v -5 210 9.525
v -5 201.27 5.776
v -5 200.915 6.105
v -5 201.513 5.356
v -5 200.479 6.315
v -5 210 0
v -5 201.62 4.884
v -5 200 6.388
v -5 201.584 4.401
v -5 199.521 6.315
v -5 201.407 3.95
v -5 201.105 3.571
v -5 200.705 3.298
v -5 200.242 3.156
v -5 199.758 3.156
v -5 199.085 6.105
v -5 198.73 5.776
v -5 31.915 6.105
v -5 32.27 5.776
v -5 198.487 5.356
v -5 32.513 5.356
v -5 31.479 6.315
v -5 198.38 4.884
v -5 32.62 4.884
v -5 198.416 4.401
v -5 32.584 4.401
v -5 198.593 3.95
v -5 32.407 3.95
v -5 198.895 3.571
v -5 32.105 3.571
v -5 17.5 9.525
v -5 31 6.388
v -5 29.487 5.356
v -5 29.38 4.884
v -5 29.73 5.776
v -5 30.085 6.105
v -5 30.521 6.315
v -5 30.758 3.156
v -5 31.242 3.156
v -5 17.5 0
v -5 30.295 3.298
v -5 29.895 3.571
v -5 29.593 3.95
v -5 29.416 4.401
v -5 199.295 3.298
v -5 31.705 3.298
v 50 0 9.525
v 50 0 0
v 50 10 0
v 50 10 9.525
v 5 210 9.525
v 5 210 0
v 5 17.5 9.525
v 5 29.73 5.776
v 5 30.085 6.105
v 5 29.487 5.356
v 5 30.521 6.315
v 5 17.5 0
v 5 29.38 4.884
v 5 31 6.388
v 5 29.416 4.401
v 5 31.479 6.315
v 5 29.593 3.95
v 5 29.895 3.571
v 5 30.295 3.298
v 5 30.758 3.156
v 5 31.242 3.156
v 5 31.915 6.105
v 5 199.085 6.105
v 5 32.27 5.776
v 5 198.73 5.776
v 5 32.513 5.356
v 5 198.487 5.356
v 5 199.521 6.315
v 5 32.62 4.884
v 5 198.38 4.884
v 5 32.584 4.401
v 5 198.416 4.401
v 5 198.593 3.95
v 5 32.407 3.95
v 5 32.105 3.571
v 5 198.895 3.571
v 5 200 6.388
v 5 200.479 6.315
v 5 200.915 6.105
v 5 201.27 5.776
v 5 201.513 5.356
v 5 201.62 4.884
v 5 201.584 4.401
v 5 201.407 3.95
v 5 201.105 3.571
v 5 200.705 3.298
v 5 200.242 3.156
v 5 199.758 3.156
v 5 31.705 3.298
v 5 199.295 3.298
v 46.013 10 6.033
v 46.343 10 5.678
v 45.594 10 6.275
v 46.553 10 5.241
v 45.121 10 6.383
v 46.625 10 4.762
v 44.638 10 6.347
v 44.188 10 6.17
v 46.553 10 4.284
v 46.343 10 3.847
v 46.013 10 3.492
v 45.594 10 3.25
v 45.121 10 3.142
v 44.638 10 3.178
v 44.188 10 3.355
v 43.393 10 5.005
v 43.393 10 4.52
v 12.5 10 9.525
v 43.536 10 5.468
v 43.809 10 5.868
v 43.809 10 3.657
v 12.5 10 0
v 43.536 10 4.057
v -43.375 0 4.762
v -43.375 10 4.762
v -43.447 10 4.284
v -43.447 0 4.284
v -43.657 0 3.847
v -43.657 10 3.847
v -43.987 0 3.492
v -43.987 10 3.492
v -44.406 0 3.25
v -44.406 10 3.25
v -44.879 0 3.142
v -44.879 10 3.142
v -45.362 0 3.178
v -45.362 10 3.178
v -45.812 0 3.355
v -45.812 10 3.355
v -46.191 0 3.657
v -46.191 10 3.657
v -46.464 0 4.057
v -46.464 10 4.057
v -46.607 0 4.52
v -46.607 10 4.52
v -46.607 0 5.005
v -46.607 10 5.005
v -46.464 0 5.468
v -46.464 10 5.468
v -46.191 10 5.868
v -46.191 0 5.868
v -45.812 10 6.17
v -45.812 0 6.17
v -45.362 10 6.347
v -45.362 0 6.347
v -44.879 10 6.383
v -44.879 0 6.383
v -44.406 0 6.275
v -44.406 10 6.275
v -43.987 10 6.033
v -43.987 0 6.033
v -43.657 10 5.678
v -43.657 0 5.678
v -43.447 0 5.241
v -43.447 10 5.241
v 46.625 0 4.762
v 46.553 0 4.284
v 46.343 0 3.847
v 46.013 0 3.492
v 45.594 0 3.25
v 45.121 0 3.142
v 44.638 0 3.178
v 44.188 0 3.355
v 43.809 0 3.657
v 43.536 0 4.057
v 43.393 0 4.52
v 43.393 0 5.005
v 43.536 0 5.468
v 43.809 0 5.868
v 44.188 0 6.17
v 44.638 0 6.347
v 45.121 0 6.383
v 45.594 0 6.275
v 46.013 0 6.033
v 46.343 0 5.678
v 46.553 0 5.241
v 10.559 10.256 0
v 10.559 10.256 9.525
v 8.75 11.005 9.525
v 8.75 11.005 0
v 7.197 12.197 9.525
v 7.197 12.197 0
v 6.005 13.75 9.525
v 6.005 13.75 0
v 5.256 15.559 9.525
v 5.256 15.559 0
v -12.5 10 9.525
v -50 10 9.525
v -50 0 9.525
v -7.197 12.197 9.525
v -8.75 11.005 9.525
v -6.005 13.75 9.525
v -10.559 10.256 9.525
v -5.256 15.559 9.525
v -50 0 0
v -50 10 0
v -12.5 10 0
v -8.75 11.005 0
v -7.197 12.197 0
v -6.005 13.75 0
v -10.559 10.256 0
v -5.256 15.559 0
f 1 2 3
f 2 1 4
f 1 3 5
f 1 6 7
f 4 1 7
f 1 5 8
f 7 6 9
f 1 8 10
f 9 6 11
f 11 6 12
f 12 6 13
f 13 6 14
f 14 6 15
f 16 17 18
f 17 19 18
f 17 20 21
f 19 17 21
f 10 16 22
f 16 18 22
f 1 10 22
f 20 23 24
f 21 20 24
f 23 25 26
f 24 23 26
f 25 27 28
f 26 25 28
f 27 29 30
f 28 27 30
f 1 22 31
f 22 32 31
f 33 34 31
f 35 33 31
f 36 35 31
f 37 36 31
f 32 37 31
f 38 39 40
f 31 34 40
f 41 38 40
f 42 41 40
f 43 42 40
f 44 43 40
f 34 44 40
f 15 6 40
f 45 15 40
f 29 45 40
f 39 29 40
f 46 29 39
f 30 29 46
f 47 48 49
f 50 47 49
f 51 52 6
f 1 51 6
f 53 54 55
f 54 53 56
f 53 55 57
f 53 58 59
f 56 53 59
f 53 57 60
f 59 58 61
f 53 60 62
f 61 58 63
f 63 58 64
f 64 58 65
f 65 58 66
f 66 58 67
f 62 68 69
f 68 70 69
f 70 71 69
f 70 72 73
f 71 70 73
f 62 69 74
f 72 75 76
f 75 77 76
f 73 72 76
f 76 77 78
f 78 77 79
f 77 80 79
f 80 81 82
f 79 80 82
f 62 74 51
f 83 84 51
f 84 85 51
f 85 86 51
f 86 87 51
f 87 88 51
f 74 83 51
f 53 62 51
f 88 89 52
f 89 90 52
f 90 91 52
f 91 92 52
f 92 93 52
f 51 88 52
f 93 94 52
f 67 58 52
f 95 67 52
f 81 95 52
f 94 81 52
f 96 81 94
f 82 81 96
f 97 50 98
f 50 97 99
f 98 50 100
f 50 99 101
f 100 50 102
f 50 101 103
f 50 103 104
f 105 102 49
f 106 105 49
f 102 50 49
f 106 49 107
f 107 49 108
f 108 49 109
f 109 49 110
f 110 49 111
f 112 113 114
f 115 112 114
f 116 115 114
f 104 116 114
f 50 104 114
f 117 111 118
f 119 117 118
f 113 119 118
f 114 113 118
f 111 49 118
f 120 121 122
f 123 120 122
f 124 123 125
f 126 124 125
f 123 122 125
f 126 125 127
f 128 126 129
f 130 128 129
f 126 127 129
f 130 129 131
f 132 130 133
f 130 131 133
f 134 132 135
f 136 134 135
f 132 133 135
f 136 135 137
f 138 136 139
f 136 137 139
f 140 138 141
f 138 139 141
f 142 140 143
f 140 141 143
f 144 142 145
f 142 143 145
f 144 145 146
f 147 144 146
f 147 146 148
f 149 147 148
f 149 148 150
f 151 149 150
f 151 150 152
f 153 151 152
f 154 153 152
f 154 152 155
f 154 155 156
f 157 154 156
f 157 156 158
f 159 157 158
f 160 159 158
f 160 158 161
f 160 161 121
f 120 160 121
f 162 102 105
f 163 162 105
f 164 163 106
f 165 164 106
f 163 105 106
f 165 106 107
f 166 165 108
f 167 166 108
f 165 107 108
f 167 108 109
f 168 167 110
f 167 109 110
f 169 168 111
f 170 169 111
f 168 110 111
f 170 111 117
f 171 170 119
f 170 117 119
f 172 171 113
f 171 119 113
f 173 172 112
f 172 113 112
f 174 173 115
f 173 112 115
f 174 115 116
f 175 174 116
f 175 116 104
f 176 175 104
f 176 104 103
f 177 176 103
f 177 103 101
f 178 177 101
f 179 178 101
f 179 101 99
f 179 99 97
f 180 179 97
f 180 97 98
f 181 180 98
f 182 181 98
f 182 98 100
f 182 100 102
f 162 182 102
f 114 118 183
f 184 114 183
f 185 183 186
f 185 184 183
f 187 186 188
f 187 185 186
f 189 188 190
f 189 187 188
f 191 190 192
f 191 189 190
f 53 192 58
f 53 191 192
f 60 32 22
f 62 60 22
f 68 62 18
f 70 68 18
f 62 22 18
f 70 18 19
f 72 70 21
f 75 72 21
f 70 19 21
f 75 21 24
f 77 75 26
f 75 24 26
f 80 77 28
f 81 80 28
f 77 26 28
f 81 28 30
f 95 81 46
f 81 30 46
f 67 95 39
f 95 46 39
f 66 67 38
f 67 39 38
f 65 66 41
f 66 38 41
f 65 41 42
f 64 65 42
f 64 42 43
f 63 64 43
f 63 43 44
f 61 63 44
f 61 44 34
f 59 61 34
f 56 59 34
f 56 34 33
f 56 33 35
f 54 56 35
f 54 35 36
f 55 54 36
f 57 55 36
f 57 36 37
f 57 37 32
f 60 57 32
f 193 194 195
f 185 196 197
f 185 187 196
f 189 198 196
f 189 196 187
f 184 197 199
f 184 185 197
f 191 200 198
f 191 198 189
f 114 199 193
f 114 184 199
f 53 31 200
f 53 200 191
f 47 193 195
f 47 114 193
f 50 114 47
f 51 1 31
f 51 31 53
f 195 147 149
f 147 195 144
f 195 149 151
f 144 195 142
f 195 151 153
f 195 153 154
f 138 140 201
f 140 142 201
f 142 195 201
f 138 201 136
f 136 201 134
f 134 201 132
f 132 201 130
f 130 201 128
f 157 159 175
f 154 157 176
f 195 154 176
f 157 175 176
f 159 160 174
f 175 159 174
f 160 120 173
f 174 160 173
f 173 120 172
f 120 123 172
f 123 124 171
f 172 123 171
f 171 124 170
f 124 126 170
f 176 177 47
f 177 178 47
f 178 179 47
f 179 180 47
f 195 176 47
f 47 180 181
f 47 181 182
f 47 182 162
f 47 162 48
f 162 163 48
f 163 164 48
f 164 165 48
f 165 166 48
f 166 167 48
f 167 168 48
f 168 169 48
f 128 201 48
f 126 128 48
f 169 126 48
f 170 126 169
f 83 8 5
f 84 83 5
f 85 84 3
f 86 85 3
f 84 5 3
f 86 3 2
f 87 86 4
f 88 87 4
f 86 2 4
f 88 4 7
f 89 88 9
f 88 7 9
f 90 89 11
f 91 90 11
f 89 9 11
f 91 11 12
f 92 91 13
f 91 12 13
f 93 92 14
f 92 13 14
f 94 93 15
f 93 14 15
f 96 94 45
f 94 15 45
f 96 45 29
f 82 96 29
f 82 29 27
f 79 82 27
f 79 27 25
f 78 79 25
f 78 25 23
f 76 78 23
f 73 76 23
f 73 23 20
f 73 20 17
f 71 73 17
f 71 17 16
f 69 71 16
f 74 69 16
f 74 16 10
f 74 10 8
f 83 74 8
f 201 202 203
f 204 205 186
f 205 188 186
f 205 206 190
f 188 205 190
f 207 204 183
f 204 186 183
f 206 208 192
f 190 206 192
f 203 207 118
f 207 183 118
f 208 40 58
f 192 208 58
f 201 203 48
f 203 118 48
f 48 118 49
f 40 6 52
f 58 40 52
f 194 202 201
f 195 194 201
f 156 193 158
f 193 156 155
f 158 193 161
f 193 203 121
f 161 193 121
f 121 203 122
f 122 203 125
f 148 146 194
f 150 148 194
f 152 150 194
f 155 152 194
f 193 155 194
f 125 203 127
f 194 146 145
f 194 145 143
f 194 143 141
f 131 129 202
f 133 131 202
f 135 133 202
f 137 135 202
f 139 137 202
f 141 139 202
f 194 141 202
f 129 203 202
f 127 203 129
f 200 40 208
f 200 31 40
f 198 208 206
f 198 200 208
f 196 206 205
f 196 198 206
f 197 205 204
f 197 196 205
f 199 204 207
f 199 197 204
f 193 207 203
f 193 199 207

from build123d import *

# Parameters (mm, degrees)
BOSS_EXTRUDE1_DEPTH = 9.525
FILLET1_R           = 7.5
SKETCH2_R           = 1.625
CUT_EXTRUDE1_DEPTH  = 11
SKETCH3_R           = 1.625
CUT_EXTRUDE2_DEPTH  = 56


with BuildPart() as part:
    # Sketch1 → Boss-Extrude1 (new body)
    with BuildSketch(Plane.XY):
        Polygon((-50, 0), (50, 0), (50, 10), (5, 10), (5, 210), (-5, 210), (-5, 10), (-50, 10), align=None)
    extrude(amount=BOSS_EXTRUDE1_DEPTH)

    # Fillet1
    fillet1_edges = [part.edges().sort_by_distance(p)[0] for p in [
        (-5, 10, 4.7625),
        (5, 10, 4.7625),
    ]]
    fillet(fillet1_edges, radius=FILLET1_R)

    # Sketch2 → Cut-Extrude1 (cut, through all)
    with BuildSketch(Plane(origin=(0, 10, 0), x_dir=(1, 0, 0), z_dir=(0, 1, 0))):
        with Locations((-45, -4.7625)):
            Circle(SKETCH2_R)
        with Locations((45, -4.7625)):
            Circle(SKETCH2_R)
    extrude(amount=-CUT_EXTRUDE1_DEPTH, mode=Mode.SUBTRACT)

    # Sketch3 → Cut-Extrude2 (cut, through all)
    with BuildSketch(Plane.ZY.offset(5)):
        with Locations((4.7625, 31)):
            Circle(SKETCH3_R)
        with Locations((4.7625, 200)):
            Circle(SKETCH3_R)
    extrude(amount=-CUT_EXTRUDE2_DEPTH, mode=Mode.SUBTRACT)


solid = part.part
